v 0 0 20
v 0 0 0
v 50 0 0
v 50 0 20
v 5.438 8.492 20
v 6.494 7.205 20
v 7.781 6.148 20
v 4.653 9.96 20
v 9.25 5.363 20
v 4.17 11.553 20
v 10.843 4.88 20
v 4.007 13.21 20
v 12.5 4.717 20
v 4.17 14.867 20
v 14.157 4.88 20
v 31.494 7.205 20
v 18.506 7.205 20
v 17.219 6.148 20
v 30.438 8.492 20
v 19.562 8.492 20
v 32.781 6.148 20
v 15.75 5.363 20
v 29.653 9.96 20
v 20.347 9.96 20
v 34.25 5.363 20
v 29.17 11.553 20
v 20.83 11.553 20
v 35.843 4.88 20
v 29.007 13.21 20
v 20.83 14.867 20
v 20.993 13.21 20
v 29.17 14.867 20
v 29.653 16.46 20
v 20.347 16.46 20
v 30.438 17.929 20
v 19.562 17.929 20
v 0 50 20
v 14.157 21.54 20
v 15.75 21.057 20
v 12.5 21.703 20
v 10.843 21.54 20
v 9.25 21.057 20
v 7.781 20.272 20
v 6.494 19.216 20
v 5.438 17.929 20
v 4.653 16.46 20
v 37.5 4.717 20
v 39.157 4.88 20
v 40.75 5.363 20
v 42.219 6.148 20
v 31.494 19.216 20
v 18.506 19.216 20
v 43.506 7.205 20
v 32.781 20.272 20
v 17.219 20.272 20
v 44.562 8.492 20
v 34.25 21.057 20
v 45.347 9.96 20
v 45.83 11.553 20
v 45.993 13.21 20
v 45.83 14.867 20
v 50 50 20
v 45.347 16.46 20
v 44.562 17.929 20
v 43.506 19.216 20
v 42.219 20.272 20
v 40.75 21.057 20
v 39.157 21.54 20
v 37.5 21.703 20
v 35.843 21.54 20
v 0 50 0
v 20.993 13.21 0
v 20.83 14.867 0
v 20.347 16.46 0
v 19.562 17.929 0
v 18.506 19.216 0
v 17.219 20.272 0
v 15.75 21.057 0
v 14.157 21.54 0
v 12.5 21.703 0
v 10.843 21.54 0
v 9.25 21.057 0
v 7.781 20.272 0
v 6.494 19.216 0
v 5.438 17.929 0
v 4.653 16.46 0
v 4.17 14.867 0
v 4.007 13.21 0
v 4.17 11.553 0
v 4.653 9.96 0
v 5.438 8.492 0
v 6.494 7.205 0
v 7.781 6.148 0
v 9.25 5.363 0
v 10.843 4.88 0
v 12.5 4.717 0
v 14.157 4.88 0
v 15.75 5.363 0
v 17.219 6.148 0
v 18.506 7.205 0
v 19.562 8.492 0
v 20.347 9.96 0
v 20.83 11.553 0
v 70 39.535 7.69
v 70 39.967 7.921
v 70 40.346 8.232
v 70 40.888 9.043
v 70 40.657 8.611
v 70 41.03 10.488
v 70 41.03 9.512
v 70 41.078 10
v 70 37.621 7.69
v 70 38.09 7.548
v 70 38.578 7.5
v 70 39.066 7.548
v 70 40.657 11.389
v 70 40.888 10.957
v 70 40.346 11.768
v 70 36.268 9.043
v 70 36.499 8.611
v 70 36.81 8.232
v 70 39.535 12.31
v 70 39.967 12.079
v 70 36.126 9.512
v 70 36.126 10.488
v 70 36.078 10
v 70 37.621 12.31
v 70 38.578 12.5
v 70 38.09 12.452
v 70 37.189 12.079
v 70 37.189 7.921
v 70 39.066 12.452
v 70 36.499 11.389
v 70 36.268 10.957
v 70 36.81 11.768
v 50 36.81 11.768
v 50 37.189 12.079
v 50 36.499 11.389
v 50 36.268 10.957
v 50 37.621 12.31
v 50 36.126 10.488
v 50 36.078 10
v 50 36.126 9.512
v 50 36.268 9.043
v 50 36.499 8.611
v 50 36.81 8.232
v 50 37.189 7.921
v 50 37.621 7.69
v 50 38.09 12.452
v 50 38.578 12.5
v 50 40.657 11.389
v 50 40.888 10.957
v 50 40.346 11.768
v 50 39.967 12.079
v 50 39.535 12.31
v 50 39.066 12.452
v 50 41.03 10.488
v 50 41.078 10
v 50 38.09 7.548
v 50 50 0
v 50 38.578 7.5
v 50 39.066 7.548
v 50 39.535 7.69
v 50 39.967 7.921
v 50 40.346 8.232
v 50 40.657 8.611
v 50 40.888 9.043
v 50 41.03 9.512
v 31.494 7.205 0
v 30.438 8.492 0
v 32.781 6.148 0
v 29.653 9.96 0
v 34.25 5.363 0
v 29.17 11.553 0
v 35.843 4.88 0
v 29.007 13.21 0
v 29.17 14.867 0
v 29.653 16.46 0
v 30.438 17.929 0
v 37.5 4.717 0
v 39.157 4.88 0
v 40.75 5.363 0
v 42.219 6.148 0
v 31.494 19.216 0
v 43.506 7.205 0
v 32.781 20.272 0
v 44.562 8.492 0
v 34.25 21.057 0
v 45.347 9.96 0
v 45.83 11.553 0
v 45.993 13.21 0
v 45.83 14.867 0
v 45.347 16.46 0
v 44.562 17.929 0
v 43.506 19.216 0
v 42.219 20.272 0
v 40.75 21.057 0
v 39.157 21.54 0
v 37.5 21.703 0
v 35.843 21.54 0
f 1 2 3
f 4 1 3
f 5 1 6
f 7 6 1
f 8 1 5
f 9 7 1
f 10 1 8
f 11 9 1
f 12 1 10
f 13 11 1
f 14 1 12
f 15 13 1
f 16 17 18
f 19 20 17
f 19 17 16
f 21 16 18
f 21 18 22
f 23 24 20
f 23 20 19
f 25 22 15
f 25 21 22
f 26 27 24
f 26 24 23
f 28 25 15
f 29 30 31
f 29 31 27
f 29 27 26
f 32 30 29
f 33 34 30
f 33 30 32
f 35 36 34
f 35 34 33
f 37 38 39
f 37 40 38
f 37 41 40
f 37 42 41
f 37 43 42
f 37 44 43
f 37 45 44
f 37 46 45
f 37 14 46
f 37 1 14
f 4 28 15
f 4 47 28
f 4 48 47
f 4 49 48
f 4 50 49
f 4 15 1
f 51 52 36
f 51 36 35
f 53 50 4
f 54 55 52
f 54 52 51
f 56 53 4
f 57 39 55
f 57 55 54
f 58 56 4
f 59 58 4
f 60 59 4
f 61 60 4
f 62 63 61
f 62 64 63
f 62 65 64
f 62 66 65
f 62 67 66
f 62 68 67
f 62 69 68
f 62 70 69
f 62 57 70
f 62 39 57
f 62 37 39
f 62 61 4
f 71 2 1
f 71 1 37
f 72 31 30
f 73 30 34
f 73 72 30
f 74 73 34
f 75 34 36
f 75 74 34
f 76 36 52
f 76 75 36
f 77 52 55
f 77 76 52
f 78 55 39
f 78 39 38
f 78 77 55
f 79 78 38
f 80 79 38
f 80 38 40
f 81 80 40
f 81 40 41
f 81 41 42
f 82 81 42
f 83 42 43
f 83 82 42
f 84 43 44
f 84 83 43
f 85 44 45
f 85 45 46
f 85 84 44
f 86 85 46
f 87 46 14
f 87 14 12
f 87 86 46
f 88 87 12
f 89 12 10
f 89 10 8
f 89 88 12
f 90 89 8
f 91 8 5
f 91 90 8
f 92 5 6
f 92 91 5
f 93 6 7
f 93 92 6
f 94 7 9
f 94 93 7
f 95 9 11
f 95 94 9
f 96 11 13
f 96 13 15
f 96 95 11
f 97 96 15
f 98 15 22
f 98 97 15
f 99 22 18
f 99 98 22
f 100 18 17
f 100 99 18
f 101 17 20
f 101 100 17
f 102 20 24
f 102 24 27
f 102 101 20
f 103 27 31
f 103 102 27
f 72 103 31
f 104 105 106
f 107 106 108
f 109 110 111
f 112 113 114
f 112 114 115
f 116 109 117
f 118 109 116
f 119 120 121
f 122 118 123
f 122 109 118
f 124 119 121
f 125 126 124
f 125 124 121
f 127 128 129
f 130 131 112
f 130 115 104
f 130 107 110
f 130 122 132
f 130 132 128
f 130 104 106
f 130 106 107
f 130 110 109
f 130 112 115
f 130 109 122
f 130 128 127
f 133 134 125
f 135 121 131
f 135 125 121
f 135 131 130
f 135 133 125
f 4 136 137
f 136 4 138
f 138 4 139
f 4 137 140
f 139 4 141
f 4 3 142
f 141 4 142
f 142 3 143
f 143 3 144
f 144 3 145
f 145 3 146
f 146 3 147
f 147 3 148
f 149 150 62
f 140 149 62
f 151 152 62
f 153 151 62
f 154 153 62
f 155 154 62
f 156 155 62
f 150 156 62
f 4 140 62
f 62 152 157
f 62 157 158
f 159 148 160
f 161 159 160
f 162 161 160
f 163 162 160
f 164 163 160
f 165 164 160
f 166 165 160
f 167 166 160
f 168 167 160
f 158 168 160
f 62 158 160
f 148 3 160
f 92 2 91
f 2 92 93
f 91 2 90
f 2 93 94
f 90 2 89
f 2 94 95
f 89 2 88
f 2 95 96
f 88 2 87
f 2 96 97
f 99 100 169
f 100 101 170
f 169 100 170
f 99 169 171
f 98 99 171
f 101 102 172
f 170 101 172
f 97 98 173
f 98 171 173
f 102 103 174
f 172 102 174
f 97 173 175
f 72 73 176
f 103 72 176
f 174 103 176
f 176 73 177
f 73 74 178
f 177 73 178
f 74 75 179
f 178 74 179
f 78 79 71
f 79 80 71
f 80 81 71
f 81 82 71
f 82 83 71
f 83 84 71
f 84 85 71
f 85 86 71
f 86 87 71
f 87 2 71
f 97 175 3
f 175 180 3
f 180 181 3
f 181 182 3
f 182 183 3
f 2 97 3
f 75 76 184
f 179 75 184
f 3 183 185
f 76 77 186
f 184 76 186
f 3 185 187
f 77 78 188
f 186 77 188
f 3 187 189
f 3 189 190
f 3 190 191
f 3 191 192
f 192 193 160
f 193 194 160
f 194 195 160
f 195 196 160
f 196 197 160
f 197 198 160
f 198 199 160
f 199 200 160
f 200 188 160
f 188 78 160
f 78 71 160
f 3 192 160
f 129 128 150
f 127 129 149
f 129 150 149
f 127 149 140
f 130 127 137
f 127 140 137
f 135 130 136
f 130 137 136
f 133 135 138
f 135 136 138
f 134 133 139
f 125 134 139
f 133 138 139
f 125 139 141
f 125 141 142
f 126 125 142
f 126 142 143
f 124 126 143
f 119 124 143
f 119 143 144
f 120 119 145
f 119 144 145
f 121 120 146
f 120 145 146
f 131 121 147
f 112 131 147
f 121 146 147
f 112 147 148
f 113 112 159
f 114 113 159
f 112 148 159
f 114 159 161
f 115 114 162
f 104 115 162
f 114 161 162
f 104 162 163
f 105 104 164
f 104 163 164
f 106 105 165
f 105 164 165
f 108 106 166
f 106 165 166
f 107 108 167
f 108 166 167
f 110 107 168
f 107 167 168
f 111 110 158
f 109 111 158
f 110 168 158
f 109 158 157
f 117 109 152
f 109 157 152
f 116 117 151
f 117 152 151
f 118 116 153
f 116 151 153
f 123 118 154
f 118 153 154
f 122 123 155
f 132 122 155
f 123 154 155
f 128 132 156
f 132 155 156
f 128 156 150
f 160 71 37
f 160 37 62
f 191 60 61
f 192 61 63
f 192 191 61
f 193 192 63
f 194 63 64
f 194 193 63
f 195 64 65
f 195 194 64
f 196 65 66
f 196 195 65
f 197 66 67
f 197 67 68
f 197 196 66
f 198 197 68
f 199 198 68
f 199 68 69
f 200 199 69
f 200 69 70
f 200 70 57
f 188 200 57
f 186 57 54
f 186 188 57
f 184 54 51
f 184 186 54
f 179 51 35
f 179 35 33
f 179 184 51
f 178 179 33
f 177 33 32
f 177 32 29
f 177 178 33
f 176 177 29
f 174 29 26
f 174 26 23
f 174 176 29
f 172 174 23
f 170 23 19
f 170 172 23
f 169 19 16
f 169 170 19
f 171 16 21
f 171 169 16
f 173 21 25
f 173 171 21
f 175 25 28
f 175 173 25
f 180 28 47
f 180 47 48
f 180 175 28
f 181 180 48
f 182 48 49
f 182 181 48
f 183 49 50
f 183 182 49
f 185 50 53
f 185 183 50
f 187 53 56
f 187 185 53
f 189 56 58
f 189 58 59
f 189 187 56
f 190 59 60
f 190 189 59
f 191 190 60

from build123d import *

# Parameters (mm, degrees)
SKETCH7_W           = 50
SKETCH7_H           = 50
SKETCH7_R           = 8.493197323
BOSS_EXTRUDE4_DEPTH = 20
SKETCH8_R           = 2.5
BOSS_EXTRUDE5_DEPTH = 20


with BuildPart() as part:
    # Sketch7 → Boss-Extrude4 (new body)
    with BuildSketch(Plane.XY):
        with Locations((25, 25)):
            Rectangle(SKETCH7_W, SKETCH7_H)
        with Locations((12.5, 13.210183113)):
            Circle(SKETCH7_R, mode=Mode.SUBTRACT)
        with Locations((37.5, 13.210183113)):
            Circle(SKETCH7_R, mode=Mode.SUBTRACT)
    extrude(amount=BOSS_EXTRUDE4_DEPTH)

    # Sketch8 → Boss-Extrude5 (add)
    with BuildSketch(Plane(origin=(50, 0, 0), x_dir=(0, 0, -1), z_dir=(1, 0, 0))):
        with Locations(Location((-10, 38.577958507, 0), (0, 0, 180))):
            Circle(SKETCH8_R)
    extrude(amount=BOSS_EXTRUDE5_DEPTH)


solid = part.part
